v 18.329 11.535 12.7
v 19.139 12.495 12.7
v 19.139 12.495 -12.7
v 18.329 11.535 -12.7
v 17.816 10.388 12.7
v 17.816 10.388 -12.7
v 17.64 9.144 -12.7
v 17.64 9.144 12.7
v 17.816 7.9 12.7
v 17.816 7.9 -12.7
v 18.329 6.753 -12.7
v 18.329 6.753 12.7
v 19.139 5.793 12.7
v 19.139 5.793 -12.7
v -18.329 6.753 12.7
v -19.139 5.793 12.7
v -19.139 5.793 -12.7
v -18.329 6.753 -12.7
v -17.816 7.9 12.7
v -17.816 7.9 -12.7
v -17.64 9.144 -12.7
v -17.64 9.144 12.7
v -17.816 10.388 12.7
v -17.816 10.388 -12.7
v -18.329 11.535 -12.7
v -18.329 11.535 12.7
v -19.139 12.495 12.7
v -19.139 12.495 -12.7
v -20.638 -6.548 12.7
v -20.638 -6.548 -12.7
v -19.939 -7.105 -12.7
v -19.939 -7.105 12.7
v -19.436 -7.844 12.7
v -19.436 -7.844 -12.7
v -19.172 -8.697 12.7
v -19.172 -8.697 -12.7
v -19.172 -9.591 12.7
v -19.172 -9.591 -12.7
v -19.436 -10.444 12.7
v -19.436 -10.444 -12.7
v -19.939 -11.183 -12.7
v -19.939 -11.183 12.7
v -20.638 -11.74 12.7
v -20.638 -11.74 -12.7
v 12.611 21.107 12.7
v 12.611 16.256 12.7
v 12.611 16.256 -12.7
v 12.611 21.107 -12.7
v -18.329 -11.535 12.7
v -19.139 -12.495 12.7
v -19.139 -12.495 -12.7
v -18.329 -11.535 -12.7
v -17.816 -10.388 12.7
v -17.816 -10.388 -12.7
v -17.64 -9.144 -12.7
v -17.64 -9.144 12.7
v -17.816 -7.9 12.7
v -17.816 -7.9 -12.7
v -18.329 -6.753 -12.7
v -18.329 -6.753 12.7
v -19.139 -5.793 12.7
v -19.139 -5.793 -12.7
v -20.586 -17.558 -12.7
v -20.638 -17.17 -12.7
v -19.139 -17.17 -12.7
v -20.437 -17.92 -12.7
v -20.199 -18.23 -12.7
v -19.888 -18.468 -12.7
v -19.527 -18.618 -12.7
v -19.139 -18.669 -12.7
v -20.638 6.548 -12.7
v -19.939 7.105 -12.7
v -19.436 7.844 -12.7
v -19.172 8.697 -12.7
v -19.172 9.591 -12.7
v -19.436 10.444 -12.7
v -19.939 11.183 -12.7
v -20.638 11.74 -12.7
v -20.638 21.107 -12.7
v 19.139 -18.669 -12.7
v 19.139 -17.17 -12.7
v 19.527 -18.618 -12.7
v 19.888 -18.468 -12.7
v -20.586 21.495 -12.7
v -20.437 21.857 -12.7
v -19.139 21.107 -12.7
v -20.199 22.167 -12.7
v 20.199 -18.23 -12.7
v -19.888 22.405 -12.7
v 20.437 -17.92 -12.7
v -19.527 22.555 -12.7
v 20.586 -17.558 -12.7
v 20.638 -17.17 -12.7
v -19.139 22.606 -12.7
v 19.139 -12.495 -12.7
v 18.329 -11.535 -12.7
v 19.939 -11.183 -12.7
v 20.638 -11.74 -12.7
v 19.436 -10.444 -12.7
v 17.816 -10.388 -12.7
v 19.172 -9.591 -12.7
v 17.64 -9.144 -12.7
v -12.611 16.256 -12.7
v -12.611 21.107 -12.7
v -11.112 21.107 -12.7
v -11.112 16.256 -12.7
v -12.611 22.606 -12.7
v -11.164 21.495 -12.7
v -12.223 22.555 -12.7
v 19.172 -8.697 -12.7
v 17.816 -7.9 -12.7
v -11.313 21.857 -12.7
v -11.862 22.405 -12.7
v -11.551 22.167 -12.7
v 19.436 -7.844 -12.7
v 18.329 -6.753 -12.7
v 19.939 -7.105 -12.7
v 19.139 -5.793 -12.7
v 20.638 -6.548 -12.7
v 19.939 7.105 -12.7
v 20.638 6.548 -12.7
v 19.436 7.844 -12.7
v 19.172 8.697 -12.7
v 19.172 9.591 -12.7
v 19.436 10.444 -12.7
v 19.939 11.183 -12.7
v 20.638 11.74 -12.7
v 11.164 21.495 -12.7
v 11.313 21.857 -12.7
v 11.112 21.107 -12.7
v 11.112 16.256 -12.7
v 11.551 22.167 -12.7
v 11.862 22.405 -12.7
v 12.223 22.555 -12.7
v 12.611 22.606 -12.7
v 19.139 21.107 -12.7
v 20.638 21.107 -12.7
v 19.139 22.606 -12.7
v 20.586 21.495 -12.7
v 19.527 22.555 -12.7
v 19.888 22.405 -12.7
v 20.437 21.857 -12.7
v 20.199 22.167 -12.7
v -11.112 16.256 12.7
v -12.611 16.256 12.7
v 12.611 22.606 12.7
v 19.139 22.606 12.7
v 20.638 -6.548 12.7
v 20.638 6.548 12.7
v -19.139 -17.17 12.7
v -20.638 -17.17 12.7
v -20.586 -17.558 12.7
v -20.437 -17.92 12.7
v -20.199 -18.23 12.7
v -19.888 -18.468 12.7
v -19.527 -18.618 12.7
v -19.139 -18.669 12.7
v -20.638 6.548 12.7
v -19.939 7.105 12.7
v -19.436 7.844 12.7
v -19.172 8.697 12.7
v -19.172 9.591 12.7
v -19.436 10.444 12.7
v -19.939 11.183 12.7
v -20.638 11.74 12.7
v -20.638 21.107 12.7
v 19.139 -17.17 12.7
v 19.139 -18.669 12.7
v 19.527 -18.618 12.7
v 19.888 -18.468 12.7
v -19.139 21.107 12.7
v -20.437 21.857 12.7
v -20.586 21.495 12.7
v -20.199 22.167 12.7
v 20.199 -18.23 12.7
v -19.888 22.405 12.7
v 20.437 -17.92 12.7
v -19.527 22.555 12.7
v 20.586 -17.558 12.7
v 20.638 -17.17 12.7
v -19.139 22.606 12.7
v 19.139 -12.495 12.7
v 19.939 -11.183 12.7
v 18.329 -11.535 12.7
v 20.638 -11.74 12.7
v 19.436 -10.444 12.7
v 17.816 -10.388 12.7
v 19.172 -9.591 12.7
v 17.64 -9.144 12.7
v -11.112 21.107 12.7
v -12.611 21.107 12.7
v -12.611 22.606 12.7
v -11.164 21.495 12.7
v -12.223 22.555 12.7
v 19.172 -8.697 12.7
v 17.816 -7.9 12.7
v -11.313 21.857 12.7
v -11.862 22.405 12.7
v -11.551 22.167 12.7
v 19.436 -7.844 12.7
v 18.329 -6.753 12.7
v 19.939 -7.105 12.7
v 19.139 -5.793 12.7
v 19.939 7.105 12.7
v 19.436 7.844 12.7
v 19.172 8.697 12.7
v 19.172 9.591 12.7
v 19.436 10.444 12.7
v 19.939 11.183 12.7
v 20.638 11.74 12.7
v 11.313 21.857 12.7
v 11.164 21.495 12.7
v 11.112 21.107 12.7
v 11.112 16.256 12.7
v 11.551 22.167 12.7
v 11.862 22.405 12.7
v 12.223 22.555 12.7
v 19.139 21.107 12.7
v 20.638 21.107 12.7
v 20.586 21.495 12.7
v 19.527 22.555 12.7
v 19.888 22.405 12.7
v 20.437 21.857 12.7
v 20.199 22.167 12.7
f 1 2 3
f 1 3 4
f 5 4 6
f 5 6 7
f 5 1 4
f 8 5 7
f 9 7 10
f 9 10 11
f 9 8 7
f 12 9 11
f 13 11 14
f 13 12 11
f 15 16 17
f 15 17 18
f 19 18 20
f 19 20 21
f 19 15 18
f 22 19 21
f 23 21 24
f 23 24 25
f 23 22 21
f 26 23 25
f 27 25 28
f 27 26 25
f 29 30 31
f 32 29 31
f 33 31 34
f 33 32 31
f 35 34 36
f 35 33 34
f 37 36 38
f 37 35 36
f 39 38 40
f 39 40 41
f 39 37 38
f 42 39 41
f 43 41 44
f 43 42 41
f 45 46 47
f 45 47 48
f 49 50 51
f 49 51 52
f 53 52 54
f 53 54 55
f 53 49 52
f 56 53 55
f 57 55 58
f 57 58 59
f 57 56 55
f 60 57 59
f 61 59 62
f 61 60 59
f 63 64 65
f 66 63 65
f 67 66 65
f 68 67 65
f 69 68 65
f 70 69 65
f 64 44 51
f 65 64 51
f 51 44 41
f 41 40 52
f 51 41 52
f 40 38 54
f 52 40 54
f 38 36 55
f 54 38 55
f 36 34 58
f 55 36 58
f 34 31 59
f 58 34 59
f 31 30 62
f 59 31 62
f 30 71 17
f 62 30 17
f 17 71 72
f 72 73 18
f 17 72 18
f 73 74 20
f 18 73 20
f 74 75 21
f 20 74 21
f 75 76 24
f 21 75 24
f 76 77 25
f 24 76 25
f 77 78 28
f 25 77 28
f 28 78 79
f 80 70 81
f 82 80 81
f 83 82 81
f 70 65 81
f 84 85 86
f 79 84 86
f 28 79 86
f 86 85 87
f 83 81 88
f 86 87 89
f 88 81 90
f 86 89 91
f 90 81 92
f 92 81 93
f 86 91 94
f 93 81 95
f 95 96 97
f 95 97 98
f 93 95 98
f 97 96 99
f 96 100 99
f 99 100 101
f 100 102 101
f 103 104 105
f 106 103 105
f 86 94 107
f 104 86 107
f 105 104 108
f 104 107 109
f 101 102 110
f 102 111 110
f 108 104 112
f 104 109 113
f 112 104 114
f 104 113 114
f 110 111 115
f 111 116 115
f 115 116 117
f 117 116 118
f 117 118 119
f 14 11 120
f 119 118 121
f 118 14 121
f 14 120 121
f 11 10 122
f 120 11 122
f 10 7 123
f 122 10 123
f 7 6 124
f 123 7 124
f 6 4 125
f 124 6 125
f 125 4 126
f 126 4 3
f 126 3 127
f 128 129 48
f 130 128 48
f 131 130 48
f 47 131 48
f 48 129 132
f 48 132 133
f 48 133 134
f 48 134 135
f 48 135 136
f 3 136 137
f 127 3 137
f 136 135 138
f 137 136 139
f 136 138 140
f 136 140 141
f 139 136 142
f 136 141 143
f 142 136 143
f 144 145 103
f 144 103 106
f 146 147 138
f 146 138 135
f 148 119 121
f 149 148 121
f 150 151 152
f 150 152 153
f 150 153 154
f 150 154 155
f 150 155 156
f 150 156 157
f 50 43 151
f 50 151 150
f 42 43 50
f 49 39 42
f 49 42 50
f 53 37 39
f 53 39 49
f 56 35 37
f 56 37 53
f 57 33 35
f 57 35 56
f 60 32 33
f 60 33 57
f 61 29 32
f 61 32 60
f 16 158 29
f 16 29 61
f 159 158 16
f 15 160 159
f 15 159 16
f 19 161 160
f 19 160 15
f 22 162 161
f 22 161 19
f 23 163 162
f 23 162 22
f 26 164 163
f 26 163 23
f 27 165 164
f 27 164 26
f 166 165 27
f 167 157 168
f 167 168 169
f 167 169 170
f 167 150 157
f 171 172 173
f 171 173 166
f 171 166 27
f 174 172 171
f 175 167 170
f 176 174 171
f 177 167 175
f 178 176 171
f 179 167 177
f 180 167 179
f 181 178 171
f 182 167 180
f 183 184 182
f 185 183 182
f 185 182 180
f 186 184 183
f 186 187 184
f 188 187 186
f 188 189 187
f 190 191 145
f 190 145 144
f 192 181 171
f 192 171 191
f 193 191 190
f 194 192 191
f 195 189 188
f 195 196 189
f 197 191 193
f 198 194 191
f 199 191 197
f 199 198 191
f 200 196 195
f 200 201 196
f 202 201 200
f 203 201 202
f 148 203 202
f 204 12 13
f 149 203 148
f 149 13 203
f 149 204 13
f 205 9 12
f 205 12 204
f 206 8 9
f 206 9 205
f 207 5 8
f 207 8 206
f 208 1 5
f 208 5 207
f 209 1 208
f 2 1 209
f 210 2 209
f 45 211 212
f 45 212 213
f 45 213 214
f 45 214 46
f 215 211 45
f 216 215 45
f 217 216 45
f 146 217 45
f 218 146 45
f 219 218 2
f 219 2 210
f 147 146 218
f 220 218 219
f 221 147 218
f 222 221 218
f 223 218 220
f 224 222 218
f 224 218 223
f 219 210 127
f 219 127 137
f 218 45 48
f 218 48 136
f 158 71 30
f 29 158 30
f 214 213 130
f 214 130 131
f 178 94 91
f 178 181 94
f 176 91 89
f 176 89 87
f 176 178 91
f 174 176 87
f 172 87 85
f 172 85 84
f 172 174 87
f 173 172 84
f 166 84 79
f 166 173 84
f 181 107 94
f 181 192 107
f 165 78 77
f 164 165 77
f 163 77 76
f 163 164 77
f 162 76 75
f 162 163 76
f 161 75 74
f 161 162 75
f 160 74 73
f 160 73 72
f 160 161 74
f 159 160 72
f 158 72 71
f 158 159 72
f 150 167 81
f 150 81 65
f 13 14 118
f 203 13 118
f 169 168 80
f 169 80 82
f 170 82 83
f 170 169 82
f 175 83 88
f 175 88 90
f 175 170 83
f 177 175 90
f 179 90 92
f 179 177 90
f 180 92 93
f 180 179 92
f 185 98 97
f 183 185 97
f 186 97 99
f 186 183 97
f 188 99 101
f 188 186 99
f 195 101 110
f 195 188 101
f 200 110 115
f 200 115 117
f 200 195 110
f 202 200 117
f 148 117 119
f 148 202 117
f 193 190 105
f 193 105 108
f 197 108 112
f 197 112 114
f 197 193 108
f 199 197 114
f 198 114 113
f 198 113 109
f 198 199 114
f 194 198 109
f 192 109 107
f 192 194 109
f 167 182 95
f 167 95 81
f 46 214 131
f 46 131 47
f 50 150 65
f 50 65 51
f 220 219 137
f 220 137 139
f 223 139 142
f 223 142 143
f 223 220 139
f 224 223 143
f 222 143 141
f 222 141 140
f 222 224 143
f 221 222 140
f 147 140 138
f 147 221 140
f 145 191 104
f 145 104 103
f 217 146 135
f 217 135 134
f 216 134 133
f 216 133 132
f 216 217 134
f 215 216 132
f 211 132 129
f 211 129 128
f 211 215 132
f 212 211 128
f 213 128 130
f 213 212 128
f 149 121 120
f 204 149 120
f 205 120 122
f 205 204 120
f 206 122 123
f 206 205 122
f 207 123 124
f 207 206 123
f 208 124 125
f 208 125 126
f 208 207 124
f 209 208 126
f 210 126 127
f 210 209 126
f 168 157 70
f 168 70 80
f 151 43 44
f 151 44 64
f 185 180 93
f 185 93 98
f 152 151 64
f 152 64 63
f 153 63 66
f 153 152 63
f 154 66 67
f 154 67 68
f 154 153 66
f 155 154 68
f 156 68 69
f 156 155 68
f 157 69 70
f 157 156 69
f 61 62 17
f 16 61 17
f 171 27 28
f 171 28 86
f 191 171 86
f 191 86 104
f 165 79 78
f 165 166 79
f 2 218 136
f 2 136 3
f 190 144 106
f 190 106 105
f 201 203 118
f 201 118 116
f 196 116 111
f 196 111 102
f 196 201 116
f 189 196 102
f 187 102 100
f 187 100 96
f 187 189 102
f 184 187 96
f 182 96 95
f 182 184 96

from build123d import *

# Parameters (mm, degrees)
BASE_EXTRUDE_DEPTH = 12.7


with BuildPart() as part:
    # Sketch1 → Base-Extrude (new, symmetric)
    with BuildSketch(Plane.XY):
        with BuildLine():
            Line((-20.6375, 21.1074), (-20.6375, 11.73965134))
            ThreePointArc((-20.6375, 11.73965134), (-19.1389, 9.144), (-20.6375, 6.54834866))
            Line((-20.6375, 6.54834866), (-20.6375, -6.54834866))
            ThreePointArc((-20.6375, -6.54834866), (-19.1389, -9.144), (-20.6375, -11.73965134))
            Line((-20.6375, -11.73965134), (-20.6375, -17.1704))
            ThreePointArc((-20.6375, -17.1704), (-20.198570222, -18.230070222), (-19.1389, -18.669))
            Line((-19.1389, -18.669), (19.1389, -18.669))
            ThreePointArc((19.1389, -18.669), (20.198570222, -18.230070222), (20.6375, -17.1704))
            Line((20.6375, -17.1704), (20.6375, -11.73965134))
            ThreePointArc((20.6375, -11.73965134), (19.1389, -9.144), (20.6375, -6.54834866))
            Line((20.6375, -6.54834866), (20.6375, 6.54834866))
            ThreePointArc((20.6375, 6.54834866), (19.1389, 9.144), (20.6375, 11.73965134))
            Line((20.6375, 11.73965134), (20.6375, 21.1074))
            ThreePointArc((20.6375, 21.1074), (20.198570222, 22.167070222), (19.1389, 22.606))
            Line((19.1389, 22.606), (12.6111, 22.606))
            ThreePointArc((12.6111, 22.606), (11.551429778, 22.167070222), (11.1125, 21.1074))
            Line((11.1125, 21.1074), (11.1125, 16.256))
            Line((11.1125, 16.256), (12.6111, 16.256))
            Line((12.6111, 16.256), (12.6111, 21.1074))
            Line((12.6111, 21.1074), (19.1389, 21.1074))
            Line((19.1389, 21.1074), (19.1389, 12.494971471))
            ThreePointArc((19.1389, 12.494971471), (17.6403, 9.144), (19.1389, 5.793028529))
            Line((19.1389, 5.793028529), (19.1389, -5.793028529))
            ThreePointArc((19.1389, -5.793028529), (17.6403, -9.144), (19.1389, -12.494971471))
            Line((19.1389, -12.494971471), (19.1389, -17.1704))
            Line((19.1389, -17.1704), (-19.1389, -17.1704))
            Line((-19.1389, -17.1704), (-19.1389, -12.494971471))
            ThreePointArc((-19.1389, -12.494971471), (-17.6403, -9.144), (-19.1389, -5.793028529))
            Line((-19.1389, -5.793028529), (-19.1389, 5.793028529))
            ThreePointArc((-19.1389, 5.793028529), (-17.6403, 9.144), (-19.1389, 12.494971471))
            Line((-19.1389, 12.494971471), (-19.1389, 21.1074))
            Line((-19.1389, 21.1074), (-12.6111, 21.1074))
            Line((-12.6111, 21.1074), (-12.6111, 16.256))
            Line((-12.6111, 16.256), (-11.1125, 16.256))
            Line((-11.1125, 16.256), (-11.1125, 21.1074))
            ThreePointArc((-11.1125, 21.1074), (-11.551429778, 22.167070222), (-12.6111, 22.606))
            Line((-12.6111, 22.606), (-19.1389, 22.606))
            ThreePointArc((-19.1389, 22.606), (-20.198570222, 22.167070222), (-20.6375, 21.1074))
        make_face()
    extrude(amount=BASE_EXTRUDE_DEPTH, both=True)


solid = part.part
